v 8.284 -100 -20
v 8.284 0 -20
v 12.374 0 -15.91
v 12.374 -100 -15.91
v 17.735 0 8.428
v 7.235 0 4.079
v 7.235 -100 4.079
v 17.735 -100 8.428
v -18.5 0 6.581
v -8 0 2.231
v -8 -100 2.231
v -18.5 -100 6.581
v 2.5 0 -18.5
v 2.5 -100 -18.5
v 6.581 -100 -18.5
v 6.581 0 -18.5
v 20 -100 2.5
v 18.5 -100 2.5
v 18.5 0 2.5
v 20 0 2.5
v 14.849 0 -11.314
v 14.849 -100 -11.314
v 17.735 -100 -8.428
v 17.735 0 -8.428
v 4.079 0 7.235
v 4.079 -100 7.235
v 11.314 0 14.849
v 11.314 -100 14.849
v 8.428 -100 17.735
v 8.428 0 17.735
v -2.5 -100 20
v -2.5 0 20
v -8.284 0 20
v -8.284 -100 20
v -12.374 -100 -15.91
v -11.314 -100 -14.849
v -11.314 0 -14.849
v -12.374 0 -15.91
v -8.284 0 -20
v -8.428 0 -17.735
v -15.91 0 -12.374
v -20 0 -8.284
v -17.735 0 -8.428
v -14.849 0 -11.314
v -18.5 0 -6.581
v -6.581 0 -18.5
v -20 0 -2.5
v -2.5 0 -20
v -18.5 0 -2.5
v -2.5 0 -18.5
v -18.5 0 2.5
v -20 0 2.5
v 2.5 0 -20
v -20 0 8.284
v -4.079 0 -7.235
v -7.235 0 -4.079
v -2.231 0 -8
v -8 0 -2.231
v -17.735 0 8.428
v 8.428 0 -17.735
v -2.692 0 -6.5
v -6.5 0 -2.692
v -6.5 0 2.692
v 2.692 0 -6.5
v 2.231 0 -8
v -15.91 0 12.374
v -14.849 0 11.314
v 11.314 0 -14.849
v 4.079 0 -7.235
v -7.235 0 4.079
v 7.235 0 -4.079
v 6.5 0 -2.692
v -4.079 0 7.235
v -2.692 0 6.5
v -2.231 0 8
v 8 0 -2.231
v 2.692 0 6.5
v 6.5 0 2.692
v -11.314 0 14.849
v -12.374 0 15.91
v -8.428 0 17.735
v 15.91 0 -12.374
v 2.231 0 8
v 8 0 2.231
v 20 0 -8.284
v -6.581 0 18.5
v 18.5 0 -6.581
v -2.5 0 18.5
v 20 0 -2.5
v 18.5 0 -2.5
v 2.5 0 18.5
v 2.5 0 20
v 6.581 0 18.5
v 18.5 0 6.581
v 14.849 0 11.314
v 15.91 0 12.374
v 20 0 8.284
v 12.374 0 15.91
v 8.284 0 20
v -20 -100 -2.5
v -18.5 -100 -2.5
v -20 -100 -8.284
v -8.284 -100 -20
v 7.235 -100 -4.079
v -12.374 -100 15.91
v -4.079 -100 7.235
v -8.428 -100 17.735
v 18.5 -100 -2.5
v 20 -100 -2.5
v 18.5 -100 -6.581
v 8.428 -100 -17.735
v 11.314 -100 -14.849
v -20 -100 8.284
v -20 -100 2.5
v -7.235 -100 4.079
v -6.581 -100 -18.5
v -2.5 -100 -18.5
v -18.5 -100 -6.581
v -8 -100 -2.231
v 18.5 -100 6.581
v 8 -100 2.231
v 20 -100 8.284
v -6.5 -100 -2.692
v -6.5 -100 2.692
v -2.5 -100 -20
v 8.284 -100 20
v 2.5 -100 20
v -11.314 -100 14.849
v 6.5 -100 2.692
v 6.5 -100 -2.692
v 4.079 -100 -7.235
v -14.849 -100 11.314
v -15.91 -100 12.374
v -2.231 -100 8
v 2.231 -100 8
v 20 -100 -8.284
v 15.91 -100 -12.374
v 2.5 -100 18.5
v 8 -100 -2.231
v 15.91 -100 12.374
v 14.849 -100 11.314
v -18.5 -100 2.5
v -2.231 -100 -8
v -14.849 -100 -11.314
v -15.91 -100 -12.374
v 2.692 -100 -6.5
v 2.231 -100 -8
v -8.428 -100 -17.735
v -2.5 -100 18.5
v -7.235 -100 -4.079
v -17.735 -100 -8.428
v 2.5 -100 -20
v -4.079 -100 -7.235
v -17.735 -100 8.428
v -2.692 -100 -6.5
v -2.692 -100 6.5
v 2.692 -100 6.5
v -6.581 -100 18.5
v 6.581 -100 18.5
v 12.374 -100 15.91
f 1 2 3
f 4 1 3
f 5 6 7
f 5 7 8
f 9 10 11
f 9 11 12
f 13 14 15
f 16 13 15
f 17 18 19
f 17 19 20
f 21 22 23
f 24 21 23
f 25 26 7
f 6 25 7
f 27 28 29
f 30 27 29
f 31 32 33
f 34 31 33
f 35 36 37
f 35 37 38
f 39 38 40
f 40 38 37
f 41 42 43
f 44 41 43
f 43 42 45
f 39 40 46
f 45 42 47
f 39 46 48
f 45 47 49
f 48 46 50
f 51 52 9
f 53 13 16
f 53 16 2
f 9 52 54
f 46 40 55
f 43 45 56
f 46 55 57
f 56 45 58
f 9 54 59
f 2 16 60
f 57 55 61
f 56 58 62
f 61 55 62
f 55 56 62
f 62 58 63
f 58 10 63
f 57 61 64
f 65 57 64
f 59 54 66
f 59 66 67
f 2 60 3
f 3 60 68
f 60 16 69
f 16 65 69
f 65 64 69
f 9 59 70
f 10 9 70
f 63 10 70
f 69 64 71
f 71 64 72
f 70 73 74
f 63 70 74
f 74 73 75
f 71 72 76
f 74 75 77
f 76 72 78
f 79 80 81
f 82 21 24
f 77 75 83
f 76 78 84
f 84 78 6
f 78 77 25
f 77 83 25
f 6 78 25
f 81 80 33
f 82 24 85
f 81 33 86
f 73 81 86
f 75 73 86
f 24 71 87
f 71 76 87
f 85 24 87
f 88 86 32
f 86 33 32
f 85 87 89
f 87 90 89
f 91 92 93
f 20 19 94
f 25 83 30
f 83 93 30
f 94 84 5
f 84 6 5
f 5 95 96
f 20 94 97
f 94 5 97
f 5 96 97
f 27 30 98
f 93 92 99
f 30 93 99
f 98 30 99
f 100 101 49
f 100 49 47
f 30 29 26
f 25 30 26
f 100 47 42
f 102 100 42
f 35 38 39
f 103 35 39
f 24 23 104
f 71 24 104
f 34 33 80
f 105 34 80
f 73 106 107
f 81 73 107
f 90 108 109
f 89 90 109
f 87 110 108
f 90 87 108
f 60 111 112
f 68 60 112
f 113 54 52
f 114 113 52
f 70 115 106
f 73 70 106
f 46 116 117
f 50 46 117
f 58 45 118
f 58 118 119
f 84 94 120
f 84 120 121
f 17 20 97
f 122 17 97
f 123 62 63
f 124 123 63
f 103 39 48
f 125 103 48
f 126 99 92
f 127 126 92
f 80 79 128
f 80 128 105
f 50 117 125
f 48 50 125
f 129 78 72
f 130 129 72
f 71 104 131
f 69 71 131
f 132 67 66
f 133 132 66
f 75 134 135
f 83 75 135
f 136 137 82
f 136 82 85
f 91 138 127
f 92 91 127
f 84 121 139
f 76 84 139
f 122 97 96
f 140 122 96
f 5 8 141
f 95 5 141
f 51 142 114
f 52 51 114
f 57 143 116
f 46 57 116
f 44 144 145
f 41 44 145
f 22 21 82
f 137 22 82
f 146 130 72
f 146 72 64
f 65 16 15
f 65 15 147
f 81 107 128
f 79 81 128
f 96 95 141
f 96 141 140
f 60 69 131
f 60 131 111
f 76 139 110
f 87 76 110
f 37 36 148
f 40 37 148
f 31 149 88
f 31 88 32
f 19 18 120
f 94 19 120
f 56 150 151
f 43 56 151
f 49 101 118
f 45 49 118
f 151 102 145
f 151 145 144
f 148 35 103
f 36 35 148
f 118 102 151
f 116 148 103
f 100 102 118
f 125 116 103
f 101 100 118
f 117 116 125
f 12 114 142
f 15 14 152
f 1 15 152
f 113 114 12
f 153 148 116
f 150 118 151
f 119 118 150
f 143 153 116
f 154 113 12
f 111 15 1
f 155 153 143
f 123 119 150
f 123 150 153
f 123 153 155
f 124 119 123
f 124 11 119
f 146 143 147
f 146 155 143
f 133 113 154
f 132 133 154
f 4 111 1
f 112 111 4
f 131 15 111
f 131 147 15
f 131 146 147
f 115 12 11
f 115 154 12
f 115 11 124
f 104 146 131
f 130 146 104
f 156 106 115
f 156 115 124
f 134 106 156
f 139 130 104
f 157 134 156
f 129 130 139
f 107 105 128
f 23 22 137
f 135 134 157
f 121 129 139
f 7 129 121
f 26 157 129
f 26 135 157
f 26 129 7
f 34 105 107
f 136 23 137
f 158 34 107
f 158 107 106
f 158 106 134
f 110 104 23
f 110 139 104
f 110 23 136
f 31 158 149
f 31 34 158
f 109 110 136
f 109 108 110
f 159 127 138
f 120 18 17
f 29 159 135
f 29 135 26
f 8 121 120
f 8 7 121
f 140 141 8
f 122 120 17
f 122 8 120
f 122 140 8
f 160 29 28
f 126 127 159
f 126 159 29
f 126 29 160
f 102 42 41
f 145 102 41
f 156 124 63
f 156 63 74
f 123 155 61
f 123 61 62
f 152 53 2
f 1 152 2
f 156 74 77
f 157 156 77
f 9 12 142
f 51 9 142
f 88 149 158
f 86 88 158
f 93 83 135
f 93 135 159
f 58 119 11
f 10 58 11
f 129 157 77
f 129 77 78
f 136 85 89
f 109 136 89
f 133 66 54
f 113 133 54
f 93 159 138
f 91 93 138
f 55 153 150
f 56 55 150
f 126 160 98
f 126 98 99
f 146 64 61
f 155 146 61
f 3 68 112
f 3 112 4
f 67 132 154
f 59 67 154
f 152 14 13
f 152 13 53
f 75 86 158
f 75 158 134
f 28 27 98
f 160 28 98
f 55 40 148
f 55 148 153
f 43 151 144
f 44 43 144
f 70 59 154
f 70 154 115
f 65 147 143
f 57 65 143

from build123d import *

# Parameters (mm, degrees)
F1_DEPTH        = 100
F3_DEPTH        = 100.001
F3_COPIES_COUNT = 8
F4_W            = 5
F4_H            = 1.5
F5_DEPTH        = 100.001
F5_COPIES_COUNT = 8


# Not quite as in the source:
# - a pattern or mirror of a feature is missing from the dataset's text; its kind, count and spacing are read off the source's solid


with BuildPart() as f1:
    # F0 (on Front) → F1 (new body)
    with BuildSketch(Plane.XZ):
        Polygon((8.2842712475, 20), (-8.2842712475, 20), (-20, 8.2842712475), (-20, -8.2842712475), (-8.2842712475, -20), (8.2842712475, -20), (20, -8.2842712475), (20, 8.2842712475), align=None)
        Polygon((-6.5, 2.6923881554), (-2.6923881554, 6.5), (2.6923881554, 6.5), (6.5, 2.6923881554), (6.5, -2.6923881554), (2.6923881554, -6.5), (-2.6923881554, -6.5), (-6.5, -2.6923881554), align=None, mode=Mode.SUBTRACT)
    extrude(amount=F1_DEPTH)

    # F2 (on face) → F3 (cut, through all)
    with BuildSketch(Plane.XZ.offset(100)):
        Polygon((-6.5805587036, 18.5), (-2.2313162987, 8), (2.2313162987, 8), (6.5805587036, 18.5), align=None)
    f3 = extrude(amount=-F3_DEPTH, mode=Mode.SUBTRACT)

    # F3_copies: F3 ×8 about axis
    f3_copies_axis = Axis((0, 0, 0), (0, 1, 0))
    for i in range(1, F3_COPIES_COUNT):
        add(f3.rotate(f3_copies_axis, i * 360 / F3_COPIES_COUNT), mode=Mode.SUBTRACT)

    # F4 (on face) → F5 (cut, through all)
    with BuildSketch(Plane.XZ.offset(100)):
        with Locations((0, 19.25)):
            Rectangle(F4_W, F4_H)
    f5 = extrude(amount=-F5_DEPTH, mode=Mode.SUBTRACT)

    # F5_copies: F5 ×8 about axis
    f5_copies_axis = Axis((0, 0, 0), (0, 1, 0))
    for i in range(1, F5_COPIES_COUNT):
        add(f5.rotate(f5_copies_axis, i * 360 / F5_COPIES_COUNT), mode=Mode.SUBTRACT)


solid = f1.part
